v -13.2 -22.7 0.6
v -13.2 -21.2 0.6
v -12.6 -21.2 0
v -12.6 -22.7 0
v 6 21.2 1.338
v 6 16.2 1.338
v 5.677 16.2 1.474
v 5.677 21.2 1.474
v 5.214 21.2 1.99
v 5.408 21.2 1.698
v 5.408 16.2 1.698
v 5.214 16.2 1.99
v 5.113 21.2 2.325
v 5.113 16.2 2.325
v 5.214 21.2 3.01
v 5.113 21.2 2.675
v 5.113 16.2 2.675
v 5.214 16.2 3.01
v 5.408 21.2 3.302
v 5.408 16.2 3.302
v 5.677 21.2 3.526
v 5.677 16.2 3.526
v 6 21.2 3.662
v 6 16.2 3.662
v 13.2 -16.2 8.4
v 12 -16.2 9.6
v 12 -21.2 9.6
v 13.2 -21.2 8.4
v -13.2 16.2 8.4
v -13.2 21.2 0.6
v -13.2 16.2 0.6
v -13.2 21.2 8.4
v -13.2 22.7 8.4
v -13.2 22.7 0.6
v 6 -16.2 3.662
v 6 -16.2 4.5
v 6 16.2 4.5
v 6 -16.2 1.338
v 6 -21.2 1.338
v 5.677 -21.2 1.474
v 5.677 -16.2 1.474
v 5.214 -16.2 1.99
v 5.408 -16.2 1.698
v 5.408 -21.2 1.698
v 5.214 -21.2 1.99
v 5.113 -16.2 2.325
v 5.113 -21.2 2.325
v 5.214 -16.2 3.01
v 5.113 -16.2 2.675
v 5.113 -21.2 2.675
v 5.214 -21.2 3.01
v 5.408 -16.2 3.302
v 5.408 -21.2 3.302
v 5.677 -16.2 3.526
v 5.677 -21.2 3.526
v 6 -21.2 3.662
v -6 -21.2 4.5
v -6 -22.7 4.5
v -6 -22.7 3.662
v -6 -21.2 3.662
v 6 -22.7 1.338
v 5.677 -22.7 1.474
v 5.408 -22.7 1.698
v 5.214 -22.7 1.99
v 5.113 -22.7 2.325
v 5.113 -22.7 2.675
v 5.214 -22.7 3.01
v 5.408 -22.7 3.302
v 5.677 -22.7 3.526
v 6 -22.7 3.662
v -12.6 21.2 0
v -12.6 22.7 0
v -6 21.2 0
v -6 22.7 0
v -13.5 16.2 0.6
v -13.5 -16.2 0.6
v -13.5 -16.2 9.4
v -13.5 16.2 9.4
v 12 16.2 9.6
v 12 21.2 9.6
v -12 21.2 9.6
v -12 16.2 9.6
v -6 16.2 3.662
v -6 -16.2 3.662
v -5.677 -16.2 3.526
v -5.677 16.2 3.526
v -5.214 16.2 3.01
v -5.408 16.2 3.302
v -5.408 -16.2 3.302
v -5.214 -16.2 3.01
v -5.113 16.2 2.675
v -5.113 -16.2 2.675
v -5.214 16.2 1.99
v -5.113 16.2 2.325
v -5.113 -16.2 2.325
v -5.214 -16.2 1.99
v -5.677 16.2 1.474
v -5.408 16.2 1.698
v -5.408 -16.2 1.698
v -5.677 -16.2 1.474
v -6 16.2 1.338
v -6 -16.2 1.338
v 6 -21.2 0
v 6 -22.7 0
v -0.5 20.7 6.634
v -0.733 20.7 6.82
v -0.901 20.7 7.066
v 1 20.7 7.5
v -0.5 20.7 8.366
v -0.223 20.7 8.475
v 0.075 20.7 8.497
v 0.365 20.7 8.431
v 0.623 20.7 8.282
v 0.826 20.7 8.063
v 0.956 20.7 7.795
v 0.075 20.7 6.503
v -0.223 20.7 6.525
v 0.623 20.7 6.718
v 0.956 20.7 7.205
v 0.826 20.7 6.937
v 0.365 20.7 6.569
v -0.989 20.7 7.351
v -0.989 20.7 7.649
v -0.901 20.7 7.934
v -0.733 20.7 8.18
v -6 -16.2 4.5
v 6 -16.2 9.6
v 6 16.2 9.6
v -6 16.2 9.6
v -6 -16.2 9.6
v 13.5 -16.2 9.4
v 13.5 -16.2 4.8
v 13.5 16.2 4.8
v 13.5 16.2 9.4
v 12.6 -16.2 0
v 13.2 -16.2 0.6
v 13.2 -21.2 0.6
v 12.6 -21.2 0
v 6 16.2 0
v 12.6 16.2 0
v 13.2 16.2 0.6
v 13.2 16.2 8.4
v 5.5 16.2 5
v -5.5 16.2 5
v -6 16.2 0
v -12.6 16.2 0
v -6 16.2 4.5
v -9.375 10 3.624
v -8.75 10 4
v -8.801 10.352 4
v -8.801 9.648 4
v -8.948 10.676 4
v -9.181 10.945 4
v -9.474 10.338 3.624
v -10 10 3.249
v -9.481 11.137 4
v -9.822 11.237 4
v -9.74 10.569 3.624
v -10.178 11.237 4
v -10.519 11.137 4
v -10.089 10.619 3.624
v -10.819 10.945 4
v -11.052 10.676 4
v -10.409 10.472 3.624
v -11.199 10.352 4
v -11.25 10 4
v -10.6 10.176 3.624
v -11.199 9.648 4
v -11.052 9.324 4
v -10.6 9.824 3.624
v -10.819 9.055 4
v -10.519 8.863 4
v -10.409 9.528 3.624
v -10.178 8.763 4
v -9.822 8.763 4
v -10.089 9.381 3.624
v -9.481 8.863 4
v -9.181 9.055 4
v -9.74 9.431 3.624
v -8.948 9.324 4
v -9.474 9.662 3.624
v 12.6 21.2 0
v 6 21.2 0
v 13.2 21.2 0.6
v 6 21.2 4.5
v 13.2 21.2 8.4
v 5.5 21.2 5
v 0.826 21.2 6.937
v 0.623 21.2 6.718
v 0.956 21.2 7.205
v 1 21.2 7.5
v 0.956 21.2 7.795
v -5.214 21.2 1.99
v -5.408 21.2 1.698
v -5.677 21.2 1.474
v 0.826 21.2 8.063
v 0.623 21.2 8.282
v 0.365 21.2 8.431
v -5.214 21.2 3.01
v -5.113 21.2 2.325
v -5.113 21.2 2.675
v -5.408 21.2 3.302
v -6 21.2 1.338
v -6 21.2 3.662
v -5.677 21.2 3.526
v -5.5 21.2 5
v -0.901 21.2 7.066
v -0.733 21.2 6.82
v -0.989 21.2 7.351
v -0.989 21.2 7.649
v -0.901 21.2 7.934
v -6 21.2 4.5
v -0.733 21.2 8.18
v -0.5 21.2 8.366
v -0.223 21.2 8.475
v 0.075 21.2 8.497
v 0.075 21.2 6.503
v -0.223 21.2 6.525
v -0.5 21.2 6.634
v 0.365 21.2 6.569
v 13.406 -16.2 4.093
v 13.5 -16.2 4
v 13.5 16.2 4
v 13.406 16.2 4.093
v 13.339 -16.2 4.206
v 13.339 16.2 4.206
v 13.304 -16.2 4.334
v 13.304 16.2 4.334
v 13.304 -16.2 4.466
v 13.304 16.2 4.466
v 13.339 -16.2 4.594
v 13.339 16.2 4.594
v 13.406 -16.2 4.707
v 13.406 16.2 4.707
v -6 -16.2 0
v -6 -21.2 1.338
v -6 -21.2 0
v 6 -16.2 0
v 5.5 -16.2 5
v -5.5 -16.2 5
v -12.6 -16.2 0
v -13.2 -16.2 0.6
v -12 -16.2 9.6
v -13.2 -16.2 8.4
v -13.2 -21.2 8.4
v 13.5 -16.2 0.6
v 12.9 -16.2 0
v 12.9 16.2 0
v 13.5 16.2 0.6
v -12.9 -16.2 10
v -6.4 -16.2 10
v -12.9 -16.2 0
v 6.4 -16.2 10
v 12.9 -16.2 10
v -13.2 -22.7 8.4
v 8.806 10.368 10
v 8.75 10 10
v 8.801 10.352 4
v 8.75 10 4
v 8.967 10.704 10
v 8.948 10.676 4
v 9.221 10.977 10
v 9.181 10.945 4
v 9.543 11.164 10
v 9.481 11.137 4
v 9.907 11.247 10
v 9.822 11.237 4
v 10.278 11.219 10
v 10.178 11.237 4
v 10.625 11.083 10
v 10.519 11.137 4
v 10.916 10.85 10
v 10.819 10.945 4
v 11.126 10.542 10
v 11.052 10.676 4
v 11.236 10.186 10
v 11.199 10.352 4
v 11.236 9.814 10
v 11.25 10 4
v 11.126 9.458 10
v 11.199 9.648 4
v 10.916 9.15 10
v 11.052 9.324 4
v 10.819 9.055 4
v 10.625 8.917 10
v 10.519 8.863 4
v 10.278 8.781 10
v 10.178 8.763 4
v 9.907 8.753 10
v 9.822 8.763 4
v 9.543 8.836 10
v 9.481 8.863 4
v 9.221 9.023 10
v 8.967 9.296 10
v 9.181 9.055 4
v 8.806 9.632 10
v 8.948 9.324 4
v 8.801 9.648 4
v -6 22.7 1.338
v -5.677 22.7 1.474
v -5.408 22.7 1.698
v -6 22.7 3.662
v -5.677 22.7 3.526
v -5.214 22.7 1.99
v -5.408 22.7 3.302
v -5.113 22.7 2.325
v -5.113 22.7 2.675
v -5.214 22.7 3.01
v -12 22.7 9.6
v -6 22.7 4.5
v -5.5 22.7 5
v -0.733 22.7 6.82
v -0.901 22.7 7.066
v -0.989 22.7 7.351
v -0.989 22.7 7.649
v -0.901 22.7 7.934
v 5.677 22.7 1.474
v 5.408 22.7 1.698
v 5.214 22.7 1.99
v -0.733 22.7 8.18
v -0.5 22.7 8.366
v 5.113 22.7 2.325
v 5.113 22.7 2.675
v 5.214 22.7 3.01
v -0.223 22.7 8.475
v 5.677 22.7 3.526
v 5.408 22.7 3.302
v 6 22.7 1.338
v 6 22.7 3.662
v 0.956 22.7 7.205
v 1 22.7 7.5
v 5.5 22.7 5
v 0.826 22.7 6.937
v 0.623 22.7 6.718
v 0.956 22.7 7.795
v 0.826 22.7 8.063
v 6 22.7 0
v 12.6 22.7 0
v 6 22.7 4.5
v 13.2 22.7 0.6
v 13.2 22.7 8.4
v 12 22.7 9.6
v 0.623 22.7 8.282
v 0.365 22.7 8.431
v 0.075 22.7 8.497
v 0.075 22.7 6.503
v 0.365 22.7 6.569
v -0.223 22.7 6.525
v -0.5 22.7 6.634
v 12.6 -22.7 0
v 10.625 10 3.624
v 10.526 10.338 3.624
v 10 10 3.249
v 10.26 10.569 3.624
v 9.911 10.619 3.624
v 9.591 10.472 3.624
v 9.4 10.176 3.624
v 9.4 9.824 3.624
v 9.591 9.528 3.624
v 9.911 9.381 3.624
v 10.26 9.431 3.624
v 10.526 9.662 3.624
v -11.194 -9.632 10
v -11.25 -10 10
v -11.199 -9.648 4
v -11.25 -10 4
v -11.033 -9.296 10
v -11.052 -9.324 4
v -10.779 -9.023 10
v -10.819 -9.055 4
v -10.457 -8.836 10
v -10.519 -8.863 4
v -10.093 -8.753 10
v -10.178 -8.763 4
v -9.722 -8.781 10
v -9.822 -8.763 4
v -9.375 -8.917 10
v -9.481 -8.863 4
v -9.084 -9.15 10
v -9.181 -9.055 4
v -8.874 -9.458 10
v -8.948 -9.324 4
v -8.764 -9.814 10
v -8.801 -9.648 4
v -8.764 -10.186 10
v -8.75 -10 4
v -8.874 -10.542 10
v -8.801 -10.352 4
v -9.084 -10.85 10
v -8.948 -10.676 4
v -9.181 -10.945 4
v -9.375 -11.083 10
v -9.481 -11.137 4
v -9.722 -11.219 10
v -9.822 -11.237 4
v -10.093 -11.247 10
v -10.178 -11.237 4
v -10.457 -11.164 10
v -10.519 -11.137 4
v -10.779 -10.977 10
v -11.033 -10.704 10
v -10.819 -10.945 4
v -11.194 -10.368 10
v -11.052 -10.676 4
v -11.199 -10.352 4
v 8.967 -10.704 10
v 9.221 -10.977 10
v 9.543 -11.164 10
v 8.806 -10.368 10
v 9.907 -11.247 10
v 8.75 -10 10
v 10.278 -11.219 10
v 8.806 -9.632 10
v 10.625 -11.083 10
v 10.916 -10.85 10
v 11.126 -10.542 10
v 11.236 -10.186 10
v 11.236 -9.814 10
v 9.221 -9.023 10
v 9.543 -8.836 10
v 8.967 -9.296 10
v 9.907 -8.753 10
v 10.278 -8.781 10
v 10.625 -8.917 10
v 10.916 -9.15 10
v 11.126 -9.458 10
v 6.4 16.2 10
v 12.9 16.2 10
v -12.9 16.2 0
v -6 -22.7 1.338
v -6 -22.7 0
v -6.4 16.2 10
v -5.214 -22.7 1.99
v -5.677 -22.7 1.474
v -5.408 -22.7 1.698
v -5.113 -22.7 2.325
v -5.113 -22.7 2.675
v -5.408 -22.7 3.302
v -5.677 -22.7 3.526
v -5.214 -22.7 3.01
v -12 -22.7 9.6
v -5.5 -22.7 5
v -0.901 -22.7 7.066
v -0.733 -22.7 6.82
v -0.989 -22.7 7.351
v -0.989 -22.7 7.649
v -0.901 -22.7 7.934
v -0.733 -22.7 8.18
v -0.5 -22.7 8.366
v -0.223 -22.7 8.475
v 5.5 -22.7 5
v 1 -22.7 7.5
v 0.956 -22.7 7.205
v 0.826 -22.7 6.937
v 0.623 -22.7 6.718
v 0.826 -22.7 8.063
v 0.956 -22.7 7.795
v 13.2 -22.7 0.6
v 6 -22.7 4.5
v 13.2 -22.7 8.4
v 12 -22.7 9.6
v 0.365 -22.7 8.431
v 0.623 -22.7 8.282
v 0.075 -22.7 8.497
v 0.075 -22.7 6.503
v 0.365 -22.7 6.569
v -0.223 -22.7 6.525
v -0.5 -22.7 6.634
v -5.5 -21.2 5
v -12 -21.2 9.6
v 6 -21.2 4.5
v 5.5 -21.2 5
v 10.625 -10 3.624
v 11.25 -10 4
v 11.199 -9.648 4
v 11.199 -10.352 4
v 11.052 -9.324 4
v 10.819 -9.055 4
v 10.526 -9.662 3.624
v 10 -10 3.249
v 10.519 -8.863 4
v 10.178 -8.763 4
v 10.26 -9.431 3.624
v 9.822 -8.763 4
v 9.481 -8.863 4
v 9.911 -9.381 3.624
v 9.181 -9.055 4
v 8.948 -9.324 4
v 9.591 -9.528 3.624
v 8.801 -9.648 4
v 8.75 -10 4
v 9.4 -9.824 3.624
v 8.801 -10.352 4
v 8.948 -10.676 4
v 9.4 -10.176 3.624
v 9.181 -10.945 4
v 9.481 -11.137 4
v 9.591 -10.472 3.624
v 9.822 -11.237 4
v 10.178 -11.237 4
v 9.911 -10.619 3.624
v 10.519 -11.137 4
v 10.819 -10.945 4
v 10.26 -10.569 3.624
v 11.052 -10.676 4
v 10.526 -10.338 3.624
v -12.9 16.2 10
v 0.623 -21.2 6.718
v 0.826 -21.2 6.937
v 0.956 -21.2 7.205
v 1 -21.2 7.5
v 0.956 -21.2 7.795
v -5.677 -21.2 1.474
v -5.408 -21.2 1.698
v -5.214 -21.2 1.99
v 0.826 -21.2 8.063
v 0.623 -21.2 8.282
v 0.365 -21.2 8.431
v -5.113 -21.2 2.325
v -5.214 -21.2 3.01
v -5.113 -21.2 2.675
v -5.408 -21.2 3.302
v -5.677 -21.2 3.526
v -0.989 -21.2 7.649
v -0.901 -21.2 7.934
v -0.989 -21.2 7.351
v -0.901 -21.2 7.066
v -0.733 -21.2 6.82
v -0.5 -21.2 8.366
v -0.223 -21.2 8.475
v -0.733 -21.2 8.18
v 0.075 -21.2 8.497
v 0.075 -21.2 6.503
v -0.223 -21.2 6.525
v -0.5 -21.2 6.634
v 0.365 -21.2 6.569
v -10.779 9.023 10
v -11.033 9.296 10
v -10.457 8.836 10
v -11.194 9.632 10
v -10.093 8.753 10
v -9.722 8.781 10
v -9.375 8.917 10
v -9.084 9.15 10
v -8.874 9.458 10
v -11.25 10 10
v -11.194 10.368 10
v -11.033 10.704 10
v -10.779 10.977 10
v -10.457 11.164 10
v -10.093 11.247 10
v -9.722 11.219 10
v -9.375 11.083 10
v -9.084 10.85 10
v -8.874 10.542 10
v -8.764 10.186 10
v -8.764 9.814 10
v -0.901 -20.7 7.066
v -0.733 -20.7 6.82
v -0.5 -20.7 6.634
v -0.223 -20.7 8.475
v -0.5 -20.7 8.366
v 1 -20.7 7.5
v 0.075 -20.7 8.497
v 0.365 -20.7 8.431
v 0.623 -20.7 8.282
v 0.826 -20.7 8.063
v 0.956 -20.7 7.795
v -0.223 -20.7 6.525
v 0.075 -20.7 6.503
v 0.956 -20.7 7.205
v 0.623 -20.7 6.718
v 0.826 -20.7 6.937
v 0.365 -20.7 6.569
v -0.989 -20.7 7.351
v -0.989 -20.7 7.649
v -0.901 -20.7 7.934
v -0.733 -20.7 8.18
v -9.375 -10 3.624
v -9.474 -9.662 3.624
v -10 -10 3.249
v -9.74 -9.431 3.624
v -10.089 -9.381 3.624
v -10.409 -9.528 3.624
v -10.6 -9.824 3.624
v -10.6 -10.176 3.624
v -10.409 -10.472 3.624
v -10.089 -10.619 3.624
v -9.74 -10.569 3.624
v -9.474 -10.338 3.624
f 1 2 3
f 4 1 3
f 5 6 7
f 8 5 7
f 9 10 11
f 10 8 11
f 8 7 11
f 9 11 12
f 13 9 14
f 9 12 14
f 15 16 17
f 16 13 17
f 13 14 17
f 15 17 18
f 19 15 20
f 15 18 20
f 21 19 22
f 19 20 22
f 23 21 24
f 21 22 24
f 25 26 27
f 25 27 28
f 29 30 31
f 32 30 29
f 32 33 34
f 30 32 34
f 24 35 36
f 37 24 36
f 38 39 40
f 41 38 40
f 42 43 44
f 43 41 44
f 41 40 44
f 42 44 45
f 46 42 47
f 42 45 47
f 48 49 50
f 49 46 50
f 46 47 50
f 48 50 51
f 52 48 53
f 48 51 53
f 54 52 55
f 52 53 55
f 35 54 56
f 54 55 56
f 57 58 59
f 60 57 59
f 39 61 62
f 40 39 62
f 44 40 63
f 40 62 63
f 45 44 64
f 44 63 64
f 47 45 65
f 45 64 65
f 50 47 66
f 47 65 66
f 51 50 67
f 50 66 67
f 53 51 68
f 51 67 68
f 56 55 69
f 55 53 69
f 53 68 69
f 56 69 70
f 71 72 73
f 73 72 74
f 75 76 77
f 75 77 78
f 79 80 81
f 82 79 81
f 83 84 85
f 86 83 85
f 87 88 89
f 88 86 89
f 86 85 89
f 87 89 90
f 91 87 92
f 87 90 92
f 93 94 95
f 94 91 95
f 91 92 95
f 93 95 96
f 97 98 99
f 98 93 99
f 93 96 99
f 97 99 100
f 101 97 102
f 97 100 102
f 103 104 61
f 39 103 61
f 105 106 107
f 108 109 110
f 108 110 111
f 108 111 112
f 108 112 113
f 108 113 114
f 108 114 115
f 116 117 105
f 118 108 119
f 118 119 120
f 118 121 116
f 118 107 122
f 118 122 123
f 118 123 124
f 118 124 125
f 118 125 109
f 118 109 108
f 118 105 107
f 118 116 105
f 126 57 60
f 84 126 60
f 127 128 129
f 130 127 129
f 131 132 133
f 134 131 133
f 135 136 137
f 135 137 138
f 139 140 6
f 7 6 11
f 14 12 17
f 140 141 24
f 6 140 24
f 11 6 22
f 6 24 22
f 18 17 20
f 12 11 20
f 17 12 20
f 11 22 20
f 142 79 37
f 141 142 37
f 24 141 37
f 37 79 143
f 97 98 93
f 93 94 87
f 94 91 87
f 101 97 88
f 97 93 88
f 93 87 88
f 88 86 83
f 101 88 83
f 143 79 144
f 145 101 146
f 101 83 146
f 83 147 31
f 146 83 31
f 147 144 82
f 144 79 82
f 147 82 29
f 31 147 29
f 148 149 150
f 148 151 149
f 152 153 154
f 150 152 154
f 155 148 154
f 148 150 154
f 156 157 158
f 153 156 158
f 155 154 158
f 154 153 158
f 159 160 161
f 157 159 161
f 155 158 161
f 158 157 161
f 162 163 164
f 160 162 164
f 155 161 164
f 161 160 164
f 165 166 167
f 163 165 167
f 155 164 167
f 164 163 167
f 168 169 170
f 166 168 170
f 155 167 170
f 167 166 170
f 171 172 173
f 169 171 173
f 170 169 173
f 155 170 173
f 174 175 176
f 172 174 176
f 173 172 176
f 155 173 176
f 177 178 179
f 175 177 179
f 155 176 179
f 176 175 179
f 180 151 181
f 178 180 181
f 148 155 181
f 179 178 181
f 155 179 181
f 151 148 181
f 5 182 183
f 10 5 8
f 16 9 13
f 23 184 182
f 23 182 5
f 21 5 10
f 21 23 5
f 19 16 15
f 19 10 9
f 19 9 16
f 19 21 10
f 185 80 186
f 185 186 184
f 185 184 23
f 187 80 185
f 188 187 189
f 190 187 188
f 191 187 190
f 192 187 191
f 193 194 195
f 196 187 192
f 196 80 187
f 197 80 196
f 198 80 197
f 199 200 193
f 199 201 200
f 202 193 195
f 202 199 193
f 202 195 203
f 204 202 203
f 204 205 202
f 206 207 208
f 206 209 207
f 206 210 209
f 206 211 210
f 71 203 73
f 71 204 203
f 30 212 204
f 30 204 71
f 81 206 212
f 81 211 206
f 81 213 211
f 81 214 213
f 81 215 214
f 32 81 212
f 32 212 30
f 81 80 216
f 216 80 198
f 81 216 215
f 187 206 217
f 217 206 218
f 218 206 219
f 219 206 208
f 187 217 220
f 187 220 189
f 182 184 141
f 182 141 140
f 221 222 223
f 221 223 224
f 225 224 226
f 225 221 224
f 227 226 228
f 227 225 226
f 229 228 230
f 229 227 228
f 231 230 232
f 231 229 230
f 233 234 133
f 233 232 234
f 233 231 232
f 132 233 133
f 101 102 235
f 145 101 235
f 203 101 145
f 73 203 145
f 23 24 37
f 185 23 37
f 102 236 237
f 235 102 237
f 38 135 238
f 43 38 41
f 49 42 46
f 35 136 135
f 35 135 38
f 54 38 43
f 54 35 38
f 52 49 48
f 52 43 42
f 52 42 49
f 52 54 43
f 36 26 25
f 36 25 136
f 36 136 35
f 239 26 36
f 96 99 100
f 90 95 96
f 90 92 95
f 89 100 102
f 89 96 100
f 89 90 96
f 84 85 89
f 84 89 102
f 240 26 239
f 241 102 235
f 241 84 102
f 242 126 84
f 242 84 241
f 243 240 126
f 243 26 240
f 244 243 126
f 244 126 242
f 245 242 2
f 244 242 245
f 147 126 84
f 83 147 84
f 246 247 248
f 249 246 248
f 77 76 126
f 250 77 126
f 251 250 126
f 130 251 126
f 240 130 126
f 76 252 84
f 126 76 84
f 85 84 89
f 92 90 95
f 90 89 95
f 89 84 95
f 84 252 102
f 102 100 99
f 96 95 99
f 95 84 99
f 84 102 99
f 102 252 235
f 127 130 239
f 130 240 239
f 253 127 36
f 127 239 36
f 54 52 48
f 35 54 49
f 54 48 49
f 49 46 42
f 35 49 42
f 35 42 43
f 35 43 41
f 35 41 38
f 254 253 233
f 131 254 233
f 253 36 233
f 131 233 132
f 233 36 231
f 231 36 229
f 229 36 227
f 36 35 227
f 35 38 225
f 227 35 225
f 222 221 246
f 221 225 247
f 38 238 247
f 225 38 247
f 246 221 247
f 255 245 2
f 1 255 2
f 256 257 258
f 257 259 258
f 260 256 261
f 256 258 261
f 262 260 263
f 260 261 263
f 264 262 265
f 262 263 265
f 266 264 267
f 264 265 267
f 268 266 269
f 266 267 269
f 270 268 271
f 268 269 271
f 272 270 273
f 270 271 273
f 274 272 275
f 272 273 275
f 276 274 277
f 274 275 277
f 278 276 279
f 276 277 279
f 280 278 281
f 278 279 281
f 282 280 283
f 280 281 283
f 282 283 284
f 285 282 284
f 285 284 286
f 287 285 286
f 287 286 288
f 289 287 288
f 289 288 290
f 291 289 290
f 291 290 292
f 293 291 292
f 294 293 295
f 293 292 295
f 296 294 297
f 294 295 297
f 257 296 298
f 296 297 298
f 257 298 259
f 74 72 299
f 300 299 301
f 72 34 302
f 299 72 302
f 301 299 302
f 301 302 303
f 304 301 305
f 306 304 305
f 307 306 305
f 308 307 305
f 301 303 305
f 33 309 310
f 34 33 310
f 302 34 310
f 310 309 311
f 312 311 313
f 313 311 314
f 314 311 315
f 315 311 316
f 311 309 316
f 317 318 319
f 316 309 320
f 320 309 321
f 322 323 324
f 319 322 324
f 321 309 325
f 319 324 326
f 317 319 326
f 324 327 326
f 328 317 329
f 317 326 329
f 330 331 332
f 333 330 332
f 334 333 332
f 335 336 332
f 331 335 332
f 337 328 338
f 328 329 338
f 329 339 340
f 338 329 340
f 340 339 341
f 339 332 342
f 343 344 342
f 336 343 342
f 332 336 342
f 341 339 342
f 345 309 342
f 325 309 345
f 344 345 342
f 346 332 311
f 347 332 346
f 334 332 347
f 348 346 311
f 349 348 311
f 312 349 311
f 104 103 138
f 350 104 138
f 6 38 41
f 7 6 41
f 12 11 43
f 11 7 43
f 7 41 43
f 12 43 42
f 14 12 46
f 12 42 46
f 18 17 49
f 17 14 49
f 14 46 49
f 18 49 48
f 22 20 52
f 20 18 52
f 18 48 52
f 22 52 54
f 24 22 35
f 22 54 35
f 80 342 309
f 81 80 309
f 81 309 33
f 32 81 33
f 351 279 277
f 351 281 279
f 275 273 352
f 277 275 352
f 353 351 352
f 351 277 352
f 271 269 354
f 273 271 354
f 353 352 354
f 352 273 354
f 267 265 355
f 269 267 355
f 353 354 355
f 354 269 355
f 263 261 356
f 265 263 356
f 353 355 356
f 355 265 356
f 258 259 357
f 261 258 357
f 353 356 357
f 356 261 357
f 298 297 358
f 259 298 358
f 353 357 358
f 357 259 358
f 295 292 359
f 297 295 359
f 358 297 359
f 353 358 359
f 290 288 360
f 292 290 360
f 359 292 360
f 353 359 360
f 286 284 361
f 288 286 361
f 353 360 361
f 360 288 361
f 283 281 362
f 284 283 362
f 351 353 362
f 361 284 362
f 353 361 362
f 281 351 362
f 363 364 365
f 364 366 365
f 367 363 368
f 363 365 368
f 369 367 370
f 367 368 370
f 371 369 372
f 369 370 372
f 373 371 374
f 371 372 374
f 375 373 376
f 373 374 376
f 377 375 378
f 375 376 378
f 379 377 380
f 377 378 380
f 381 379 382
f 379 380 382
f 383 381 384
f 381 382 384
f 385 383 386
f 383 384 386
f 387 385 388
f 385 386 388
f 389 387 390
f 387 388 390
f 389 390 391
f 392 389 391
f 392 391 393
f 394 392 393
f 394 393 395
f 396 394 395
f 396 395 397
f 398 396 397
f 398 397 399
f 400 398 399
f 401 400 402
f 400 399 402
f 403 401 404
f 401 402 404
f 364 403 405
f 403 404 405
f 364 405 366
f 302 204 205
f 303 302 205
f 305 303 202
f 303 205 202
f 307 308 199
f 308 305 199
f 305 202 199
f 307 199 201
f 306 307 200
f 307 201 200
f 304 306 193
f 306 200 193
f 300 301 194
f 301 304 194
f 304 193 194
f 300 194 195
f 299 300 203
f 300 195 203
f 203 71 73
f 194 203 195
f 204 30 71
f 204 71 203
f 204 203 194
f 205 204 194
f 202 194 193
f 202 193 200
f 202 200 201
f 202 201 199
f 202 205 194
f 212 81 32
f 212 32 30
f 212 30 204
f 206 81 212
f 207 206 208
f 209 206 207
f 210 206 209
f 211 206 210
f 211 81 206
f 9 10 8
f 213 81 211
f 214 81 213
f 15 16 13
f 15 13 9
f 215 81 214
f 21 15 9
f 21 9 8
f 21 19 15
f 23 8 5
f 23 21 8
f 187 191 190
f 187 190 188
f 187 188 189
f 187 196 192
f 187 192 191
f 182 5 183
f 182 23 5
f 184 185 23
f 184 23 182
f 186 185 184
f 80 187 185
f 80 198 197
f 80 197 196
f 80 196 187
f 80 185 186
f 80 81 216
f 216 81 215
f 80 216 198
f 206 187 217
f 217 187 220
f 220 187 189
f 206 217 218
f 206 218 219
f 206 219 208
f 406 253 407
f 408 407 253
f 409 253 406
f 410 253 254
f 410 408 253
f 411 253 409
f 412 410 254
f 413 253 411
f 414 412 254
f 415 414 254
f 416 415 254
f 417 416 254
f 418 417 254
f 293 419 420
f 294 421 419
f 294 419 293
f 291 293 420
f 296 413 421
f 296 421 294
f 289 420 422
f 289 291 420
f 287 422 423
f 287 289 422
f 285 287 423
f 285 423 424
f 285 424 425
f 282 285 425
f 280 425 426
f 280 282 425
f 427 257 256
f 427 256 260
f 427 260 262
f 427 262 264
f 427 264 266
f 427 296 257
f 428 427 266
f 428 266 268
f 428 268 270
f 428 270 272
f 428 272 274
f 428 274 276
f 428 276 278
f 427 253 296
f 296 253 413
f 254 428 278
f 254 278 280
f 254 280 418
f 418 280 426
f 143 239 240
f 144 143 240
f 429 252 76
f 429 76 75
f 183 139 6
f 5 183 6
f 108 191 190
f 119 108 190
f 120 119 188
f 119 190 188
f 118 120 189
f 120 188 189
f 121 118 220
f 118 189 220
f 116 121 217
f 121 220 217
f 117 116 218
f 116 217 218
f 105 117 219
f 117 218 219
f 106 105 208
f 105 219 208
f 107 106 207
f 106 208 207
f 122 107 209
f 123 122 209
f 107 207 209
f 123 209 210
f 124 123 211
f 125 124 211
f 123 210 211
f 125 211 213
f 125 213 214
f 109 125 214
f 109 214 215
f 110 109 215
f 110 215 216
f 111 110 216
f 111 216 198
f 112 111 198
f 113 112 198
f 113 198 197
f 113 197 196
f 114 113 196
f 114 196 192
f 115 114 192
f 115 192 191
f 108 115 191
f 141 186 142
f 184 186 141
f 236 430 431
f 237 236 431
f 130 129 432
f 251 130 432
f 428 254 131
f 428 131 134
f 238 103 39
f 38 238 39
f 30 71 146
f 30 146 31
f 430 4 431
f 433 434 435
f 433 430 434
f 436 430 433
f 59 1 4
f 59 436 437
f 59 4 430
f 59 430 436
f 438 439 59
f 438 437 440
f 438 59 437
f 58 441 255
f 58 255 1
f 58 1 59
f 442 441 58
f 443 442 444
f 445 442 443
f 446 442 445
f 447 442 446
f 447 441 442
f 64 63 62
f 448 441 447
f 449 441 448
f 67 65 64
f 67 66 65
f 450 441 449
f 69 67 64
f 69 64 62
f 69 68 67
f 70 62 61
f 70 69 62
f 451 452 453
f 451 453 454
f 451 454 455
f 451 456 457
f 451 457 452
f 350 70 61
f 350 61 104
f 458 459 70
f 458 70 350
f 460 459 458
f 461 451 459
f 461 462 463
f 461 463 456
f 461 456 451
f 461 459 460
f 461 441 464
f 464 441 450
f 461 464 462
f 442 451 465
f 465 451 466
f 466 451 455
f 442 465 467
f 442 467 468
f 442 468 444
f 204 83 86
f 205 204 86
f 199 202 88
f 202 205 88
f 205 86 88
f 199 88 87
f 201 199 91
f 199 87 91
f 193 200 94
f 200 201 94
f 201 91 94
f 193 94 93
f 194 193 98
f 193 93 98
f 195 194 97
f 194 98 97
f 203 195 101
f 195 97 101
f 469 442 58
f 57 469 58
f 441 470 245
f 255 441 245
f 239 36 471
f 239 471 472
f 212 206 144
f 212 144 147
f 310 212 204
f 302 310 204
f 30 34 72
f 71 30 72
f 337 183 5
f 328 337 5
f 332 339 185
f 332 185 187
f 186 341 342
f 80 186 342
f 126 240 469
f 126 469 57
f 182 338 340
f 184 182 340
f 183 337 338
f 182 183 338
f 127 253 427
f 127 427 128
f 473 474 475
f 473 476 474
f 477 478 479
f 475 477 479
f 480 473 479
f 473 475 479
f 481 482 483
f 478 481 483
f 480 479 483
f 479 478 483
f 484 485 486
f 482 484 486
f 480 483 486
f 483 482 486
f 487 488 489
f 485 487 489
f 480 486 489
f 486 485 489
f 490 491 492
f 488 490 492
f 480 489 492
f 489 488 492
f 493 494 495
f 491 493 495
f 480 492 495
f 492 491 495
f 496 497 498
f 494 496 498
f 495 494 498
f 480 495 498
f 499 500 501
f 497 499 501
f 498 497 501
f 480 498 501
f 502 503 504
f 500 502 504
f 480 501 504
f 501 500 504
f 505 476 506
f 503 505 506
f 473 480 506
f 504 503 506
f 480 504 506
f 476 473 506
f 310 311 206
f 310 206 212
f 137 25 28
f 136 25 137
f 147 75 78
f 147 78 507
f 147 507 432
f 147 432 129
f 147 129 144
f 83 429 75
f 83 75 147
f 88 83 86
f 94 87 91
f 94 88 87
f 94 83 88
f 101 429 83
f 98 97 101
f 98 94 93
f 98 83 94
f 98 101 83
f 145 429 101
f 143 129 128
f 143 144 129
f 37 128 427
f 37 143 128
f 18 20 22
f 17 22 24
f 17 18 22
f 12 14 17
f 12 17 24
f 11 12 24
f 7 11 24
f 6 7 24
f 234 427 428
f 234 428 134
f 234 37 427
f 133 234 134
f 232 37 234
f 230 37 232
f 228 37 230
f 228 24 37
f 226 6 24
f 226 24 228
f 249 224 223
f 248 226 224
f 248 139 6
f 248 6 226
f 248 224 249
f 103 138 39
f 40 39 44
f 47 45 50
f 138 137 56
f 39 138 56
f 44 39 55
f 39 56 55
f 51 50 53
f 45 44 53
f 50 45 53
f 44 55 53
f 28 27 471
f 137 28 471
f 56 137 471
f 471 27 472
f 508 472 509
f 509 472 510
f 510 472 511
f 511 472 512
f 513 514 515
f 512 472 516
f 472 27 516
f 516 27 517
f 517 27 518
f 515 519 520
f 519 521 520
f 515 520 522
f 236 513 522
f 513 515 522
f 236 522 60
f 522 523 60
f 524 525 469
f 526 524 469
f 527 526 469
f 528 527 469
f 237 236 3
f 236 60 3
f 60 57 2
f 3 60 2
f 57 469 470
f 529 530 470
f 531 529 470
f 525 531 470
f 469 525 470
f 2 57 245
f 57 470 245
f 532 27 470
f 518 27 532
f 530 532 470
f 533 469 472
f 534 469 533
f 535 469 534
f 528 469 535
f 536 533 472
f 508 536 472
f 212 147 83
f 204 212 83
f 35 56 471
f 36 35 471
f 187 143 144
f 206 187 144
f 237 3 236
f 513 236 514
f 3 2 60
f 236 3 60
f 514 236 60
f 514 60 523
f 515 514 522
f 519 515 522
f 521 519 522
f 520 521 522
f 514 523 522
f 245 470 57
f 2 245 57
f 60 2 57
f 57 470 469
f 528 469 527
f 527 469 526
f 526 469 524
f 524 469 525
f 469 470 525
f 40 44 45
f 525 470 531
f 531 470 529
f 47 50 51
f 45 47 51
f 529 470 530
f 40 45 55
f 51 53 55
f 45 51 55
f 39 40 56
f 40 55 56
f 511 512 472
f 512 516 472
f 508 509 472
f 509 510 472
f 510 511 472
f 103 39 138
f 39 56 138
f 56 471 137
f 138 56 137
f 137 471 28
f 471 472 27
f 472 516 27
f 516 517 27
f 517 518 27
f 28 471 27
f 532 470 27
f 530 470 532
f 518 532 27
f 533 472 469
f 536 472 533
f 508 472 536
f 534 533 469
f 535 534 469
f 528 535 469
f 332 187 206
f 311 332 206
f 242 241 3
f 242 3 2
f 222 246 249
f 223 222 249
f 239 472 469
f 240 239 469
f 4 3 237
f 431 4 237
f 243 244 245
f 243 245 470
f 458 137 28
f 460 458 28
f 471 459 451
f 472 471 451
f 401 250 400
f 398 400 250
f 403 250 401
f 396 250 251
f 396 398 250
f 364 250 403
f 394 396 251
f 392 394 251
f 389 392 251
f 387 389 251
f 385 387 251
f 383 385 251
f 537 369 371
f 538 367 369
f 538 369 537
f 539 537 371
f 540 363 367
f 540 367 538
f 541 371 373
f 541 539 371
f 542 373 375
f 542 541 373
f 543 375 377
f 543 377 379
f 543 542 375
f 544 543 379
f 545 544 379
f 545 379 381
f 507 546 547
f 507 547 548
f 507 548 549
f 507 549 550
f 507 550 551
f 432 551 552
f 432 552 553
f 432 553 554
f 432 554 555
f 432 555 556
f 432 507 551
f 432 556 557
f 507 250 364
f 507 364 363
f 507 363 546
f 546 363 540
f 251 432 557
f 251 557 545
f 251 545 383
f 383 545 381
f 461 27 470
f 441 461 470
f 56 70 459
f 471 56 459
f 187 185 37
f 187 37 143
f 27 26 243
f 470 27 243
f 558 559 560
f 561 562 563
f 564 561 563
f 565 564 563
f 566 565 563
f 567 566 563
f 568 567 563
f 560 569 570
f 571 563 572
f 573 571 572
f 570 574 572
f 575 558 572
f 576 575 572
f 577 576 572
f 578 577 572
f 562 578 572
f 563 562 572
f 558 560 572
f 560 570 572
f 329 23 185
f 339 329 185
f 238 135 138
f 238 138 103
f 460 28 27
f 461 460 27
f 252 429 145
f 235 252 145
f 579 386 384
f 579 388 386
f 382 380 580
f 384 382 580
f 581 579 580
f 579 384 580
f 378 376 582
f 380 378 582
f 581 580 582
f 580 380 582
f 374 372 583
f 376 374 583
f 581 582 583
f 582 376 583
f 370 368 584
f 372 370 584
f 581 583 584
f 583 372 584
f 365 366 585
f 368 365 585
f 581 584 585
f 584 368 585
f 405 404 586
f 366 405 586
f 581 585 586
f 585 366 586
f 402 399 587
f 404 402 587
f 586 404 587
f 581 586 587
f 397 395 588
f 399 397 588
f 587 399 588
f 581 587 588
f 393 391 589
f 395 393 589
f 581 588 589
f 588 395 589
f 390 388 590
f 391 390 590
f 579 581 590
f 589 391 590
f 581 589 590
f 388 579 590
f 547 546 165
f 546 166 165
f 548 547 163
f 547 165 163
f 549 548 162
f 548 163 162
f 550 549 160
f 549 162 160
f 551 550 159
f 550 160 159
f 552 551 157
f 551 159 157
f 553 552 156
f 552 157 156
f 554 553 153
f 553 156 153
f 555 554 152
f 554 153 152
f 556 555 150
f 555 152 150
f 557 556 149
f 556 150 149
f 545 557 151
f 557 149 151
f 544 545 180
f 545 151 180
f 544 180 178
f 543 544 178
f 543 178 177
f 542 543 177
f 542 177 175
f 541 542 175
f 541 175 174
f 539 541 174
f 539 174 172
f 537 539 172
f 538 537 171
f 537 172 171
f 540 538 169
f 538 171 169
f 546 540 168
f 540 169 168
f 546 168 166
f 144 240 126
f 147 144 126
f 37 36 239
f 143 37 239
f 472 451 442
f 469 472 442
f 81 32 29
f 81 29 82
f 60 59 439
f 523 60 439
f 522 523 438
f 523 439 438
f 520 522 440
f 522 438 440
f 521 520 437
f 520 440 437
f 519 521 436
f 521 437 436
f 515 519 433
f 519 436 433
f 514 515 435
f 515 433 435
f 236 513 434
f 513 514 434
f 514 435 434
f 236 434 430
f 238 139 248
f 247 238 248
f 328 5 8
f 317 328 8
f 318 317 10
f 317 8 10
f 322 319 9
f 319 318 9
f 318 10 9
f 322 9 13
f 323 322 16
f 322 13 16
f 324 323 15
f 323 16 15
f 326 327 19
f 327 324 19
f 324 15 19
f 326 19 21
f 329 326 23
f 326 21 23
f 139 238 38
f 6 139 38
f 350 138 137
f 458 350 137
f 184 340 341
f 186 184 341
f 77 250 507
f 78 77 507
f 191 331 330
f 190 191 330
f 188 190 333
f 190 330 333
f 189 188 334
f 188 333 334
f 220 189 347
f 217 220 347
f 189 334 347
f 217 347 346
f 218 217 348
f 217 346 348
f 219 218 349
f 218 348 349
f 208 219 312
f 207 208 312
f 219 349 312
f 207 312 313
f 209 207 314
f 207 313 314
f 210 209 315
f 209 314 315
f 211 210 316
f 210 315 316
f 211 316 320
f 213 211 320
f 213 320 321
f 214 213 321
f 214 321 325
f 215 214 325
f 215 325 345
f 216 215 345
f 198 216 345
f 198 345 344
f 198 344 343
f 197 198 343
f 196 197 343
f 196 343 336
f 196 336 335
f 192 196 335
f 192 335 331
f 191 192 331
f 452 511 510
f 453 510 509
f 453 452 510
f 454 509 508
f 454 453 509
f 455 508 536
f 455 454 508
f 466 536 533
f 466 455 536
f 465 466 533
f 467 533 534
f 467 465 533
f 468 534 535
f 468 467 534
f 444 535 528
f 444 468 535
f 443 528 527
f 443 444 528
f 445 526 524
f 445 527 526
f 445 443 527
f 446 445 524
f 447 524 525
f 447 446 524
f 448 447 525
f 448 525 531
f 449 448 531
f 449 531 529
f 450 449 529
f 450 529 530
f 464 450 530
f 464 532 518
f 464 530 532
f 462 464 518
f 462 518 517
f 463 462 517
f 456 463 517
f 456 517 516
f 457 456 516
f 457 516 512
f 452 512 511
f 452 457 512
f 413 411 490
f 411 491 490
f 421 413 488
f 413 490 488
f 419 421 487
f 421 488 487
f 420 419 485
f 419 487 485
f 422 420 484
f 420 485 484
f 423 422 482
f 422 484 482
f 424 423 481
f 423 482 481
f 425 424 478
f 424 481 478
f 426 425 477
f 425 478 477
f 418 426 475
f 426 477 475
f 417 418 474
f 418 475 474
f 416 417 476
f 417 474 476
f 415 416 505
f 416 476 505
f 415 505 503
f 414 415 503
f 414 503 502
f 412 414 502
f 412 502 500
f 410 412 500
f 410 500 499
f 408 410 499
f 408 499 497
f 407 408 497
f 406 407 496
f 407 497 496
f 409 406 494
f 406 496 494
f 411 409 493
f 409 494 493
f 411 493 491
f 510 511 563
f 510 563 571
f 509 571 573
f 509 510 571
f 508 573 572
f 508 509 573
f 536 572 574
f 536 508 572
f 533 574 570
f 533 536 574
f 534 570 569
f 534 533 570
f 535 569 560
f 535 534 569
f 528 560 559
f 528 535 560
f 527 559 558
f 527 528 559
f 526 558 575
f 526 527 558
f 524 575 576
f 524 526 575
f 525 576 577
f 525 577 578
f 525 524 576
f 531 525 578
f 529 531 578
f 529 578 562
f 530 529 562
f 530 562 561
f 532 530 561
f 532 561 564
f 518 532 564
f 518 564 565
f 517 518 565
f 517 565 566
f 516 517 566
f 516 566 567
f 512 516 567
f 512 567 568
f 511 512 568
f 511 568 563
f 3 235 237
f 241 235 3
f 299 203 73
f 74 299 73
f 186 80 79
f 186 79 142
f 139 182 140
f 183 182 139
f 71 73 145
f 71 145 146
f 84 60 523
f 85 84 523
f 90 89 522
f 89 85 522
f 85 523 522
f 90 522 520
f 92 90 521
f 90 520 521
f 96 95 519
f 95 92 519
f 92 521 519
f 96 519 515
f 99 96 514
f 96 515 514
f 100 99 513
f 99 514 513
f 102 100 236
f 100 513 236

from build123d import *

# Parameters (mm, degrees)
SKICA1_W                 = 27
SKICA1_H                 = 32.4
P_IDAT_VYSUNUT_M1_DEPTH  = 10
ZKOSEN_1_SIZE            = 0.6
ODEBRAT_VYSUNUT_M1_DEPTH = 33.4
M3_Z_VIT1_D              = 2.5
M3_Z_VIT1_DEPTH          = 6
M3_Z_VIT1_TIP            = 0.751075774
P_IDAT_VYSUNUT_M2_DEPTH  = 5
P_IDAT_VYSUNUT_M3_DEPTH  = 1.5
LINPOLE1_COUNT           = 2
LINPOLE1_PITCH           = 37.4
LINPOLE2_COUNT           = 2
LINPOLE2_PITCH           = 43.9
ODEBRAT_VYSUNUT_M2_DEPTH = 46.4
ODEBRAT_VYSUNUT_M3_DEPTH = 39.9
SKICA9_R                 = 1
ODEBRAT_VYSUNUT_M4_DEPTH = 2


with BuildPart() as part:
    # Skica1 → Přidat vysunutím1 (new body)
    with BuildSketch(Plane.XY):
        Rectangle(SKICA1_W, SKICA1_H)
    extrude(amount=P_IDAT_VYSUNUT_M1_DEPTH)

    # Zkosení1
    zkosen_1_edges = [part.edges().sort_by_distance(p)[0] for p in [
        (-13.5, 0, 10),
        (13.5, 0, 10),
        (-13.5, 0, 0),
        (13.5, 0, 0),
    ]]
    chamfer(zkosen_1_edges, length=ZKOSEN_1_SIZE)

    # Skica2 → Odebrat vysunutím1 (cut, through all)
    with BuildSketch(Plane.XZ.offset(16.2)):
        Polygon((-6.4, 10), (6.400378165, 10), (6, 9.6), (-6, 9.6), align=None)
    extrude(amount=-ODEBRAT_VYSUNUT_M1_DEPTH, mode=Mode.SUBTRACT)

    # M3 závit1
    with Locations(Plane.XY.offset(10)):
        with Locations((-10, 10), (-10, -10), (10, -10), (10, 10)):
            Hole(M3_Z_VIT1_D / 2, depth=M3_Z_VIT1_DEPTH)
            with Locations((0, 0, -(M3_Z_VIT1_DEPTH + M3_Z_VIT1_TIP / 2))):  # 118° drill point
                Cone(0, M3_Z_VIT1_D / 2, M3_Z_VIT1_TIP, mode=Mode.SUBTRACT)


with BuildPart() as body_2:
    # Skica5 → Přidat vysunutím2 (new body)
    with BuildSketch(Plane.XZ.offset(16.2)):
        Polygon((-6, 9.6), (6, 9.6), (12, 9.6), (13.2, 8.4), (13.2, 0.6), (12.6, 0), (-12.6, 0), (-13.2, 0.6), (-13.2, 8.4), (-12, 9.6), align=None)
    p_idat_vysunut_m2 = extrude(amount=P_IDAT_VYSUNUT_M2_DEPTH)


with BuildPart() as body_3:
    # Skica6 → Přidat vysunutím3 (new body)
    with BuildSketch(Plane.XZ.offset(21.2)):
        Polygon((12, 9.6), (-12, 9.6), (-13.2, 8.4), (-13.2, 0.6), (-12.6, 0), (12.6, 0), (13.2, 0.6), (13.2, 8.4), align=None)
    extrude(amount=P_IDAT_VYSUNUT_M3_DEPTH)


with BuildPart() as linpole1_1:
    # LinPole1: Přidat vysunutím2 ×2
    with Locations(*[(0, i * LINPOLE1_PITCH, 0) for i in range(1, LINPOLE1_COUNT)]):
        add(p_idat_vysunut_m2)


with BuildPart() as linpole2_1:
    # LinPole2: pattern copy
    add(body_3.part.moved(Location(Vector(0, 1, 0) * (1 * LINPOLE2_PITCH))))


with BuildPart() as odebrat_vysunut_m2_tool:
    # Skica7 → Odebrat vysunutím2 (new body, through all)
    with BuildSketch(Plane.XZ.offset(22.7)):
        with BuildLine():
            Line((-6, 1.338104996), (-6, 0))
            Line((-6, 0), (6, 0))
            Line((6, 0), (6, 1.338104996))
            ThreePointArc((6, 1.338104996), (5.1, 2.5), (6, 3.661895004))
            Line((6, 3.661895004), (6, 4.5))
            Line((6, 4.5), (5.5, 5))
            Line((5.5, 5), (-5.5, 5))
            Line((-5.5, 5), (-6, 4.5))
            Line((-6, 4.5), (-6, 3.661895004))
            ThreePointArc((-6, 3.661895004), (-5.1, 2.5), (-6, 1.338104996))
        make_face()
    extrude(amount=-ODEBRAT_VYSUNUT_M2_DEPTH)


with BuildPart() as part_1:
    add(part.part)

    # Odebrat vysunutím2: cut by odebrat_vysunut_m2_tool
    add(odebrat_vysunut_m2_tool.part, mode=Mode.SUBTRACT)

    # Skica8 → Odebrat vysunutím3 (cut, through all)
    with BuildSketch(Plane.XZ.offset(16.2)):
        with BuildLine():
            Line((13.5, 4.8), (13.5, 4))
            ThreePointArc((13.5, 4), (13.3, 4.4), (13.5, 4.8))
        make_face()
    extrude(amount=-ODEBRAT_VYSUNUT_M3_DEPTH, mode=Mode.SUBTRACT)


with BuildPart() as body_2_1:
    add(body_2.part)

    # Odebrat vysunutím2: cut by odebrat_vysunut_m2_tool
    add(odebrat_vysunut_m2_tool.part, mode=Mode.SUBTRACT)


with BuildPart() as body_3_1:
    add(body_3.part)

    # Odebrat vysunutím2: cut by odebrat_vysunut_m2_tool
    add(odebrat_vysunut_m2_tool.part, mode=Mode.SUBTRACT)


with BuildPart() as linpole1_1_1:
    add(linpole1_1.part)

    # Odebrat vysunutím2: cut by odebrat_vysunut_m2_tool
    add(odebrat_vysunut_m2_tool.part, mode=Mode.SUBTRACT)


with BuildPart() as linpole2_1_1:
    add(linpole2_1.part)

    # Odebrat vysunutím2: cut by odebrat_vysunut_m2_tool
    add(odebrat_vysunut_m2_tool.part, mode=Mode.SUBTRACT)


with BuildPart() as odebrat_vysunut_m4_tool:
    # Skica9 → Odebrat vysunutím4 (new body)
    with BuildSketch(Plane(origin=(0, 22.7, 0), x_dir=(1, 0, 0), z_dir=(0, 1, 0))):
        with Locations((0, -7.5)):
            Circle(SKICA9_R)
    odebrat_vysunut_m4 = extrude(amount=-ODEBRAT_VYSUNUT_M4_DEPTH)


with BuildPart() as linpole1_1_2:
    add(linpole1_1_1.part)

    # Odebrat vysunutím4: cut by odebrat_vysunut_m4_tool
    add(odebrat_vysunut_m4_tool.part, mode=Mode.SUBTRACT)


with BuildPart() as linpole2_1_2:
    add(linpole2_1_1.part)

    # Odebrat vysunutím4: cut by odebrat_vysunut_m4_tool
    add(odebrat_vysunut_m4_tool.part, mode=Mode.SUBTRACT)


with BuildPart() as zrcadlit4_tool:
    # Zrcadlit4: Odebrat vysunutím4 across plane
    add(odebrat_vysunut_m4.mirror(Plane.ZX))


with BuildPart() as body_2_2:
    add(body_2_1.part)

    # Zrcadlit4: cut by zrcadlit4_tool
    add(zrcadlit4_tool.part, mode=Mode.SUBTRACT)


with BuildPart() as body_3_2:
    add(body_3_1.part)

    # Zrcadlit4: cut by zrcadlit4_tool
    add(zrcadlit4_tool.part, mode=Mode.SUBTRACT)


solid = Compound([part_1.part, linpole1_1_2.part, linpole2_1_2.part, body_2_2.part, body_3_2.part])
